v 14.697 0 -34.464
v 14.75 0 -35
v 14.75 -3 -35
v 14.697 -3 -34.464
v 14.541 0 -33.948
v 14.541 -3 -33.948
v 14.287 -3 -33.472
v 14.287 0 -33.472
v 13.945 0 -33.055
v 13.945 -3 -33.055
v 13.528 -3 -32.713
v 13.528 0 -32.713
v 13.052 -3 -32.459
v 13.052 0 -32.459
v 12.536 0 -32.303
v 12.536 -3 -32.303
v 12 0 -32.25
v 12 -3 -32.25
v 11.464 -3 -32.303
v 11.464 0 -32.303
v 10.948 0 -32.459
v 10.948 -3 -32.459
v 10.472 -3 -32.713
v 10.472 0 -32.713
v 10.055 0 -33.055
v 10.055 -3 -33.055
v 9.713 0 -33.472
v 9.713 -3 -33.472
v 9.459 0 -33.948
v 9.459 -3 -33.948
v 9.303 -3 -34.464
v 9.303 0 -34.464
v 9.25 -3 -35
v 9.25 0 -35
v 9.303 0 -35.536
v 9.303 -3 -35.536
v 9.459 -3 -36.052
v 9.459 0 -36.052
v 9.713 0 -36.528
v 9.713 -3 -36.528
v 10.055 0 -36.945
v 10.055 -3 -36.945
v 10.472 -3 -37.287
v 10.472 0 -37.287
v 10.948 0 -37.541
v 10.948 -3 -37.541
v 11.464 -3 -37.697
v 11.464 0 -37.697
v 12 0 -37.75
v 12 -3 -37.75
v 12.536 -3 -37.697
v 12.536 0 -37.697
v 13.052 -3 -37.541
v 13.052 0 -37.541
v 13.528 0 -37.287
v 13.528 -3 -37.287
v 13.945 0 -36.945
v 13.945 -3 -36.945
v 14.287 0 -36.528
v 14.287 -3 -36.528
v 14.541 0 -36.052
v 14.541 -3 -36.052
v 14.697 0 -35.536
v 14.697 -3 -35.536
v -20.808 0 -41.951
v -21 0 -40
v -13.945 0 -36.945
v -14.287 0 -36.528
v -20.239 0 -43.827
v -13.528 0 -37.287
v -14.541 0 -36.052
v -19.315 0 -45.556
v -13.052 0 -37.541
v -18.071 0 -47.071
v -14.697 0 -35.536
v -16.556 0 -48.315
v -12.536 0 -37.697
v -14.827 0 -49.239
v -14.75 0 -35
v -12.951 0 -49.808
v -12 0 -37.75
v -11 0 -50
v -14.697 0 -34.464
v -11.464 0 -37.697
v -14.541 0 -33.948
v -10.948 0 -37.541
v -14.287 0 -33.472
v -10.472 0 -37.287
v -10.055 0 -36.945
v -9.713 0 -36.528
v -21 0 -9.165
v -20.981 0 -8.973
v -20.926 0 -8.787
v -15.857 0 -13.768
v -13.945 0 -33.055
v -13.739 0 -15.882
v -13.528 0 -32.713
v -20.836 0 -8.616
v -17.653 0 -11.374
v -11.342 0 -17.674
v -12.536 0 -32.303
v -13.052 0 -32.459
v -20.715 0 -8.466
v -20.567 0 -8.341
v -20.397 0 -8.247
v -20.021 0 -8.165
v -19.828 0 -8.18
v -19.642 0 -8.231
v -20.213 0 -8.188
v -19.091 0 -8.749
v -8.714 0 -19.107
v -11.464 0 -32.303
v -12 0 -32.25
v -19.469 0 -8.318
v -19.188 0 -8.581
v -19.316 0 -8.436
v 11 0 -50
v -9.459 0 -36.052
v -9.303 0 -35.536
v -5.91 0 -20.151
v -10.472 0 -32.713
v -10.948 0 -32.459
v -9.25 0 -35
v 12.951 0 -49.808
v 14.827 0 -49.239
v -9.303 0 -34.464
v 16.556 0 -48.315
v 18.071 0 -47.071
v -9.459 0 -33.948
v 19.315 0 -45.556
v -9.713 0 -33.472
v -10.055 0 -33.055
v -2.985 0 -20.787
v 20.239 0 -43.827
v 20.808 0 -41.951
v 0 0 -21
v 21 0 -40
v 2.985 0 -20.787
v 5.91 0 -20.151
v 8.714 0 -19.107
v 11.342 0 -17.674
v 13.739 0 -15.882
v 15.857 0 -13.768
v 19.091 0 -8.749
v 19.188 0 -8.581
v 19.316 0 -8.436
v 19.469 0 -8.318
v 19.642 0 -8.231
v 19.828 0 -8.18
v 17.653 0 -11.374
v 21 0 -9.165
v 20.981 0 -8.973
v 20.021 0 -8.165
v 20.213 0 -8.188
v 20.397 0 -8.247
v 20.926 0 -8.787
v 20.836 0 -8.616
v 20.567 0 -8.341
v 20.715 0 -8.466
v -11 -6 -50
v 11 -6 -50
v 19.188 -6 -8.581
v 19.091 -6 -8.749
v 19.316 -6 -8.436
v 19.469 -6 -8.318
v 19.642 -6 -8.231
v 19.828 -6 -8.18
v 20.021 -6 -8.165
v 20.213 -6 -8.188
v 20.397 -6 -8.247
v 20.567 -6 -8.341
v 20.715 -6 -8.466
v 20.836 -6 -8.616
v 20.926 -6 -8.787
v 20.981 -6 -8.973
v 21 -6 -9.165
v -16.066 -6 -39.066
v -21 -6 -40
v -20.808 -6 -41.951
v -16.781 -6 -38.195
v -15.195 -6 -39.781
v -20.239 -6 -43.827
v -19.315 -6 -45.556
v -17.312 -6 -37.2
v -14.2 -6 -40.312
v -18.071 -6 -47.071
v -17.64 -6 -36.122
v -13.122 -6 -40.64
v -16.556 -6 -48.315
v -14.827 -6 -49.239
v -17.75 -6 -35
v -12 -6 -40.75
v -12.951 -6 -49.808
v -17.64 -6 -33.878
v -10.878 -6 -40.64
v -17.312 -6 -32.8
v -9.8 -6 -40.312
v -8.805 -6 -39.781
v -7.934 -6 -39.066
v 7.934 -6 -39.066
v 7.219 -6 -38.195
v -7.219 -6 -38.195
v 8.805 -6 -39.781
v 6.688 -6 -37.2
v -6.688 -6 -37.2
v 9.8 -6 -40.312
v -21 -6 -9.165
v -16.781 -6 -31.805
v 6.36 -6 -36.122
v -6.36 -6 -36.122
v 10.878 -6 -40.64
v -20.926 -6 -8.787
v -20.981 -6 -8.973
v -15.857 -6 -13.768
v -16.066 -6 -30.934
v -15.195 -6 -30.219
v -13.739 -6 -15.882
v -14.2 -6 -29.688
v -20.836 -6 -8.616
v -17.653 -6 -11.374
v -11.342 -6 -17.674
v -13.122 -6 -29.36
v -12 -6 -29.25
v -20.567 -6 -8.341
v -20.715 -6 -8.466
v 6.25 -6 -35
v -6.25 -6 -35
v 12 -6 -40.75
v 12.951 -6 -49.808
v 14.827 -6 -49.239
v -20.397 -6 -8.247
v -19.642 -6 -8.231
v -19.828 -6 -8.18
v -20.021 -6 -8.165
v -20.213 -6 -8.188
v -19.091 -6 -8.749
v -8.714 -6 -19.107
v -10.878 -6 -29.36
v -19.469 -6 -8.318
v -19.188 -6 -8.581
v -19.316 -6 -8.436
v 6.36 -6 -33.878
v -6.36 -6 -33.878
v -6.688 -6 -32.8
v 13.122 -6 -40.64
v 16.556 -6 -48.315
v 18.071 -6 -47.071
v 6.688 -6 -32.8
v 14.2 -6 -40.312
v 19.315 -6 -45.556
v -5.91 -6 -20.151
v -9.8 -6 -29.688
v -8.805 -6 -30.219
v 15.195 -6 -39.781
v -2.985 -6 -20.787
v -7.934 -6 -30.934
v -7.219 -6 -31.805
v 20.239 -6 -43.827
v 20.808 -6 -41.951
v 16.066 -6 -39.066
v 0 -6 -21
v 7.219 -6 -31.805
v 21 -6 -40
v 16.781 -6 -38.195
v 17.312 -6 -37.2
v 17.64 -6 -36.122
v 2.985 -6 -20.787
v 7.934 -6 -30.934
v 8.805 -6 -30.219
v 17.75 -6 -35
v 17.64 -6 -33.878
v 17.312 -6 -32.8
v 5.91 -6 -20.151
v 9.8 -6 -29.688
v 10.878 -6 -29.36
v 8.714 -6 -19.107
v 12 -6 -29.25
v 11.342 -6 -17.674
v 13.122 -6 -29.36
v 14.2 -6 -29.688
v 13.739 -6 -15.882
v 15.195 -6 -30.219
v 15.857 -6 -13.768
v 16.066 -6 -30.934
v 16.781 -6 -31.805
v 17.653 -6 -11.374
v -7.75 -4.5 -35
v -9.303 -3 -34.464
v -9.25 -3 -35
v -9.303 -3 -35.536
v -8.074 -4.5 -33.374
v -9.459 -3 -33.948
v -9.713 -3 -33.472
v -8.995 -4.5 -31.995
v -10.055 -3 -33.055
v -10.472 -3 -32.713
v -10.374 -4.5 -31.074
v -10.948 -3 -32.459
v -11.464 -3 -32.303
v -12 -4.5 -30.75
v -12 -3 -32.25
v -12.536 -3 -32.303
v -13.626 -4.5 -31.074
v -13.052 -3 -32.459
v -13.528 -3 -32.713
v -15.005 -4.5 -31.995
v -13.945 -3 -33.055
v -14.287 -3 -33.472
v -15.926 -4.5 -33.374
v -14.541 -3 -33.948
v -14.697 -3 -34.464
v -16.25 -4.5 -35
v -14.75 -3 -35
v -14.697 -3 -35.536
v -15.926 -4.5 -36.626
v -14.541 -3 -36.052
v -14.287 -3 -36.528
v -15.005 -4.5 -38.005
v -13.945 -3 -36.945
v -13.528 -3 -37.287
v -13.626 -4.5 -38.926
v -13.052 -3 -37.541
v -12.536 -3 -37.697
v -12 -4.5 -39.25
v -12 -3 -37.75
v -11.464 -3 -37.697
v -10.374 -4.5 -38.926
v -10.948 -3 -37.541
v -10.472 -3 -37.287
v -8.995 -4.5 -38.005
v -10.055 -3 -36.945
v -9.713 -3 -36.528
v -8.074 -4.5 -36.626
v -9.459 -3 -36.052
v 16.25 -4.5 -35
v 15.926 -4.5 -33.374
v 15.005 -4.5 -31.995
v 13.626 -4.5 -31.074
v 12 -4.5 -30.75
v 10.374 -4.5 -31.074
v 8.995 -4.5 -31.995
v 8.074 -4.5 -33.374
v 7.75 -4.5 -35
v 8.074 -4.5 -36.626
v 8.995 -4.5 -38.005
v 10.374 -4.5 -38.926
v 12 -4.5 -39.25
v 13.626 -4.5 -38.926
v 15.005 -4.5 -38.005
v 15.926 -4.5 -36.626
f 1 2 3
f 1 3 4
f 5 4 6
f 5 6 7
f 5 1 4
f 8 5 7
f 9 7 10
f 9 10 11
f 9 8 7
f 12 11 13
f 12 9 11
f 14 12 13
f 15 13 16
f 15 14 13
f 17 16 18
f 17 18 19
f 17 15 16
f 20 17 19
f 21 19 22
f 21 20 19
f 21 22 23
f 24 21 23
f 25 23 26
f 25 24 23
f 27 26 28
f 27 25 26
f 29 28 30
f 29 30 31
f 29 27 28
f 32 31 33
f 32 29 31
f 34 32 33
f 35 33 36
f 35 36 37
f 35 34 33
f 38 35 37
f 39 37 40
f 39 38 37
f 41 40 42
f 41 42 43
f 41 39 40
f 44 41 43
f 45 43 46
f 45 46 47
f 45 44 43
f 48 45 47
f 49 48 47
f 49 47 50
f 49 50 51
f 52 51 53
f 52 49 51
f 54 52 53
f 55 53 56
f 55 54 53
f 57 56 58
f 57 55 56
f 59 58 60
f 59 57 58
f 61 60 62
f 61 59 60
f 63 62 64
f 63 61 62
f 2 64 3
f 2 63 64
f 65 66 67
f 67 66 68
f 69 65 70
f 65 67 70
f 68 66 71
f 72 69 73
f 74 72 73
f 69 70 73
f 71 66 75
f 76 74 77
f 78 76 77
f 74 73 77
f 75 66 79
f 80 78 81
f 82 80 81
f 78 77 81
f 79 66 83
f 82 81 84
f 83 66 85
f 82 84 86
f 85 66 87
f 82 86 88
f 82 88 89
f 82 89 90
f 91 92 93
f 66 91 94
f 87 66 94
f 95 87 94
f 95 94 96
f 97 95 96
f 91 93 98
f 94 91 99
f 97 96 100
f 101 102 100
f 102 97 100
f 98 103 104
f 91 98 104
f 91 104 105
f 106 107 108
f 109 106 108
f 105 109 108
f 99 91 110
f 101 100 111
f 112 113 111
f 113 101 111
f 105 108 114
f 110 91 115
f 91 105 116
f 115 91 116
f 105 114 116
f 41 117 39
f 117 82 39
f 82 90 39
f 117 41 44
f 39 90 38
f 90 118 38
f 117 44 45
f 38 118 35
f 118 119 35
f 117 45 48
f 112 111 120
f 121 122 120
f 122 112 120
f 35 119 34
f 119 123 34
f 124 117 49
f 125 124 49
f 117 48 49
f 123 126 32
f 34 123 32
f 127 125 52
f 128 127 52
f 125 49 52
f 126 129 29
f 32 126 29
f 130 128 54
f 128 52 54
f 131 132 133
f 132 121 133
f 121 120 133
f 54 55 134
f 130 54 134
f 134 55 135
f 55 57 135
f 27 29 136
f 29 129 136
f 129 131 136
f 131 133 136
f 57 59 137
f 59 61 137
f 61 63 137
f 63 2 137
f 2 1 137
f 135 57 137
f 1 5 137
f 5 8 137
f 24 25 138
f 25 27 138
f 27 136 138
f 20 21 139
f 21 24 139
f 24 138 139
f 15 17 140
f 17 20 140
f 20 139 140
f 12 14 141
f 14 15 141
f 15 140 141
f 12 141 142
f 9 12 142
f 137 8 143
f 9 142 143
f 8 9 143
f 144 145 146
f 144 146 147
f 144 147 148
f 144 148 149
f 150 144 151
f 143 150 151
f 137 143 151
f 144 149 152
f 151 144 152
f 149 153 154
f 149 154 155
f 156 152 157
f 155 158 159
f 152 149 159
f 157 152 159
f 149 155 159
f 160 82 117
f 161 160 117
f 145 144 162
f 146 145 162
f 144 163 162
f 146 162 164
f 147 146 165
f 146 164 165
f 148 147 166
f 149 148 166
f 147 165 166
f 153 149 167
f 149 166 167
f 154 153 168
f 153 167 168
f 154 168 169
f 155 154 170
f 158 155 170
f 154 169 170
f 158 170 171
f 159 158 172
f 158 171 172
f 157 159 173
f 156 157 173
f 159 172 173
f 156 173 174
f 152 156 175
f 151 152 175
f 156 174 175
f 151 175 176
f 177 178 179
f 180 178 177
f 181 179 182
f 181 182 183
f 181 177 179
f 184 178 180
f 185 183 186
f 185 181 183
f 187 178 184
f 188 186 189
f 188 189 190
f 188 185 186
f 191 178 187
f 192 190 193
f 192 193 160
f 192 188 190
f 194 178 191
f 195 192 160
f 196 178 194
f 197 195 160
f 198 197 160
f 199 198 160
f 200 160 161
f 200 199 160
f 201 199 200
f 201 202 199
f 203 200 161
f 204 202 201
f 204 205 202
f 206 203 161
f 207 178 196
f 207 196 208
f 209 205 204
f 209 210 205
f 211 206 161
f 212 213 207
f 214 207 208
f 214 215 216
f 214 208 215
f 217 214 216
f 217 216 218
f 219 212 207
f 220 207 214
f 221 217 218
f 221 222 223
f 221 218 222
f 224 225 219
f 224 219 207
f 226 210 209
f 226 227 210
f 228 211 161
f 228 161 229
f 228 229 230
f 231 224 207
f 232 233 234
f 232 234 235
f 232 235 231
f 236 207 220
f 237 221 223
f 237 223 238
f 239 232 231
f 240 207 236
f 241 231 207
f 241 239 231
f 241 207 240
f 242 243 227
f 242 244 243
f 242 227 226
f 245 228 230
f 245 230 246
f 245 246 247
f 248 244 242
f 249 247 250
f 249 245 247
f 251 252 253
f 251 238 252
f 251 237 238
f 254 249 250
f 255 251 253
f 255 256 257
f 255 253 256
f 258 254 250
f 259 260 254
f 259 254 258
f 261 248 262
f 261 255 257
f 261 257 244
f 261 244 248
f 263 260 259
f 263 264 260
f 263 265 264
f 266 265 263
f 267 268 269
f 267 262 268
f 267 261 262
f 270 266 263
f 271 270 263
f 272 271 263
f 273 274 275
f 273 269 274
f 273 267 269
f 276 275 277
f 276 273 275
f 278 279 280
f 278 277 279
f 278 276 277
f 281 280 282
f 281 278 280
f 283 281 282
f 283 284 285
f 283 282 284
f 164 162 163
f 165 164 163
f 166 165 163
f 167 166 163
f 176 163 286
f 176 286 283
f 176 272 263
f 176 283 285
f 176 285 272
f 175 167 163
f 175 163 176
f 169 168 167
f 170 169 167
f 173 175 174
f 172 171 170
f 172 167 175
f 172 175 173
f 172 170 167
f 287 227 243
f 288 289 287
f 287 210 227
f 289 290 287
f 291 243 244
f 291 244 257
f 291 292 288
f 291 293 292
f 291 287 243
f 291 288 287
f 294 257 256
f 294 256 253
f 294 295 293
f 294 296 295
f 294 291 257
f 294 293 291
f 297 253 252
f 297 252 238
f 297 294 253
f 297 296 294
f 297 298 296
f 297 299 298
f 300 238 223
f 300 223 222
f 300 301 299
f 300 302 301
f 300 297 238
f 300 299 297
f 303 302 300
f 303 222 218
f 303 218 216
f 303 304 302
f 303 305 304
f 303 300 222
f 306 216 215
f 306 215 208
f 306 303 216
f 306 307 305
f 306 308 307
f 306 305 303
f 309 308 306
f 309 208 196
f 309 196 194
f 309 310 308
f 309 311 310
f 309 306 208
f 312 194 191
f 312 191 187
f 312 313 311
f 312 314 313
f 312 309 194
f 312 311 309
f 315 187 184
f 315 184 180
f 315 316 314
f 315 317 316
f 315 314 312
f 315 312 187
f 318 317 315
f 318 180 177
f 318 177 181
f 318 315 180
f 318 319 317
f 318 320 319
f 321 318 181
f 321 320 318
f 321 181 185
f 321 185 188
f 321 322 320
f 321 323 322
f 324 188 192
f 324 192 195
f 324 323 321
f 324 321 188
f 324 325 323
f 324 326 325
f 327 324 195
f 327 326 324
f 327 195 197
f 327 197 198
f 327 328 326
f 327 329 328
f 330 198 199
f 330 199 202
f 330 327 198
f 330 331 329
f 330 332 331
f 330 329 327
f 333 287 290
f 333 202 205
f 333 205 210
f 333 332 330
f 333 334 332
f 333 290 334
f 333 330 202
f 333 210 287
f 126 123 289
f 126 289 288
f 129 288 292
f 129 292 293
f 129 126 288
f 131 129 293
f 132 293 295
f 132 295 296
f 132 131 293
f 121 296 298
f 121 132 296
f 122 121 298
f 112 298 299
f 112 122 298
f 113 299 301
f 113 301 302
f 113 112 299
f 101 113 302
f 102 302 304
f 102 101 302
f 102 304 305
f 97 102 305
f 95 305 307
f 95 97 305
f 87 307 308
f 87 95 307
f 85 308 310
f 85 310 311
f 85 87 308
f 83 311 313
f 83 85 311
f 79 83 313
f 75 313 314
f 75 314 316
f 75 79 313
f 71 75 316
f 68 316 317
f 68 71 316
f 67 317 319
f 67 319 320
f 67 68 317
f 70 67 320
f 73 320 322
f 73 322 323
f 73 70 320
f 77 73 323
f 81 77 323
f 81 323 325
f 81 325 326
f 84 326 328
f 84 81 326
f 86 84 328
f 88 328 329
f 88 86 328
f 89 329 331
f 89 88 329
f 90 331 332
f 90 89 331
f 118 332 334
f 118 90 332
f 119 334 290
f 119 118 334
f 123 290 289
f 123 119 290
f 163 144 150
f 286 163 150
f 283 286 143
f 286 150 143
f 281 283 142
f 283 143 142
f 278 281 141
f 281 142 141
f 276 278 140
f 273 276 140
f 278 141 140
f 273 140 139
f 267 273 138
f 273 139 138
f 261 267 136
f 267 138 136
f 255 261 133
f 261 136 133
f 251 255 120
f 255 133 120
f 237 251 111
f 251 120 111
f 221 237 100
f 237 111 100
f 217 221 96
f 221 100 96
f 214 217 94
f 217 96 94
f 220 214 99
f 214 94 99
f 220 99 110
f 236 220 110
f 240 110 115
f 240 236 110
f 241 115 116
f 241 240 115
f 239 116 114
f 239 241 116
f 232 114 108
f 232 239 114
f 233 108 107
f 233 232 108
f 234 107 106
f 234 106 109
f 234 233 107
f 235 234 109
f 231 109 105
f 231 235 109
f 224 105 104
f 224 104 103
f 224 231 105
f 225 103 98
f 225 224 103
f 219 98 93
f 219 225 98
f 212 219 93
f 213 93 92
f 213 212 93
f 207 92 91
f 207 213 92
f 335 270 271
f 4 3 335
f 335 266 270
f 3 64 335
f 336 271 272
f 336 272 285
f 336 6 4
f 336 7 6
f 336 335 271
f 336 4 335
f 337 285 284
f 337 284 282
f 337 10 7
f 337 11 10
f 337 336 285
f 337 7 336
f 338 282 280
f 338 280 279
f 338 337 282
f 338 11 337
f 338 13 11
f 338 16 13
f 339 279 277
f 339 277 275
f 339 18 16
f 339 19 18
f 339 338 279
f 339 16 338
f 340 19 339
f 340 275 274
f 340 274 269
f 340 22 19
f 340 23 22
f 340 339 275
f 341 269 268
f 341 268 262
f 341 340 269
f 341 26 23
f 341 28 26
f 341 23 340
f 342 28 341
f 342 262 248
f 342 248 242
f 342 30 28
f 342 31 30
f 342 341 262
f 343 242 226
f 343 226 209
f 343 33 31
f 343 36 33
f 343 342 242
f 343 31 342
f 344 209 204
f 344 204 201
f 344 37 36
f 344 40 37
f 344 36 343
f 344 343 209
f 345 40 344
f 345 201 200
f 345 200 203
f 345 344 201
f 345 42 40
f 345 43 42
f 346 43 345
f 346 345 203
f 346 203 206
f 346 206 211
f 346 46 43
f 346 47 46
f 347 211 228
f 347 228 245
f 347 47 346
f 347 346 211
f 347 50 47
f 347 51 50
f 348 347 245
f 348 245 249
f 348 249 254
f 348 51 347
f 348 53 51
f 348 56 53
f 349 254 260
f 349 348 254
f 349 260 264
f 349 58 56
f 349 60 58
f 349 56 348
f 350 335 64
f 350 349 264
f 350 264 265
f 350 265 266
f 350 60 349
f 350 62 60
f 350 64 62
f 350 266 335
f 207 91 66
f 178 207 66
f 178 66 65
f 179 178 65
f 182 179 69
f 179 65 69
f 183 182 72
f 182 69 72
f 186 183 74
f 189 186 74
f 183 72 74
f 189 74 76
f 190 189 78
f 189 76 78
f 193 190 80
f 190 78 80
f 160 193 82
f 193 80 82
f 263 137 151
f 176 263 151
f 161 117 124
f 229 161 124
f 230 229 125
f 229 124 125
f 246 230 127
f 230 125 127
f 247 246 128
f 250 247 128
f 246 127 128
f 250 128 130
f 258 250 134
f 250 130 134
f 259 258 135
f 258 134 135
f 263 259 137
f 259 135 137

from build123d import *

# Parameters (mm, degrees)
F0_R     = 2.75
F1_DEPTH = 6
F2_R     = 1
F3_SIZE  = 3


with BuildPart() as f1:
    # F0 (on Front) → F1 (new body)
    with BuildSketch(Plane.XZ):
        with BuildLine():
            ThreePointArc((21, 0), (0, -21), (-21, 0))
            Line((-21, 0), (-21, -40))
            ThreePointArc((-21, -40), (-18.071068, -47.071068), (-11, -50))
            Line((-11, -50), (11, -50))
            ThreePointArc((11, -50), (18.071068, -47.071068), (21, -40))
            Line((21, -40), (21, 0))
        make_face()
        with Locations((-12, -35)):
            Circle(F0_R, mode=Mode.SUBTRACT)
        with Locations((12, -35)):
            Circle(F0_R, mode=Mode.SUBTRACT)
    extrude(amount=F1_DEPTH)

    # F2
    f2_edges = [f1.edges().sort_by_distance(p)[0] for p in [
        (-21, -3, 0),
        (21, -3, 0),
    ]]
    fillet(f2_edges, radius=F2_R)

    # F3
    f3_edges = [f1.edges().sort_by_distance(p)[0] for p in [
        (-14.75, -6, -35),
        (9.25, -6, -35),
    ]]
    chamfer(f3_edges, length=F3_SIZE)


solid = f1.part
